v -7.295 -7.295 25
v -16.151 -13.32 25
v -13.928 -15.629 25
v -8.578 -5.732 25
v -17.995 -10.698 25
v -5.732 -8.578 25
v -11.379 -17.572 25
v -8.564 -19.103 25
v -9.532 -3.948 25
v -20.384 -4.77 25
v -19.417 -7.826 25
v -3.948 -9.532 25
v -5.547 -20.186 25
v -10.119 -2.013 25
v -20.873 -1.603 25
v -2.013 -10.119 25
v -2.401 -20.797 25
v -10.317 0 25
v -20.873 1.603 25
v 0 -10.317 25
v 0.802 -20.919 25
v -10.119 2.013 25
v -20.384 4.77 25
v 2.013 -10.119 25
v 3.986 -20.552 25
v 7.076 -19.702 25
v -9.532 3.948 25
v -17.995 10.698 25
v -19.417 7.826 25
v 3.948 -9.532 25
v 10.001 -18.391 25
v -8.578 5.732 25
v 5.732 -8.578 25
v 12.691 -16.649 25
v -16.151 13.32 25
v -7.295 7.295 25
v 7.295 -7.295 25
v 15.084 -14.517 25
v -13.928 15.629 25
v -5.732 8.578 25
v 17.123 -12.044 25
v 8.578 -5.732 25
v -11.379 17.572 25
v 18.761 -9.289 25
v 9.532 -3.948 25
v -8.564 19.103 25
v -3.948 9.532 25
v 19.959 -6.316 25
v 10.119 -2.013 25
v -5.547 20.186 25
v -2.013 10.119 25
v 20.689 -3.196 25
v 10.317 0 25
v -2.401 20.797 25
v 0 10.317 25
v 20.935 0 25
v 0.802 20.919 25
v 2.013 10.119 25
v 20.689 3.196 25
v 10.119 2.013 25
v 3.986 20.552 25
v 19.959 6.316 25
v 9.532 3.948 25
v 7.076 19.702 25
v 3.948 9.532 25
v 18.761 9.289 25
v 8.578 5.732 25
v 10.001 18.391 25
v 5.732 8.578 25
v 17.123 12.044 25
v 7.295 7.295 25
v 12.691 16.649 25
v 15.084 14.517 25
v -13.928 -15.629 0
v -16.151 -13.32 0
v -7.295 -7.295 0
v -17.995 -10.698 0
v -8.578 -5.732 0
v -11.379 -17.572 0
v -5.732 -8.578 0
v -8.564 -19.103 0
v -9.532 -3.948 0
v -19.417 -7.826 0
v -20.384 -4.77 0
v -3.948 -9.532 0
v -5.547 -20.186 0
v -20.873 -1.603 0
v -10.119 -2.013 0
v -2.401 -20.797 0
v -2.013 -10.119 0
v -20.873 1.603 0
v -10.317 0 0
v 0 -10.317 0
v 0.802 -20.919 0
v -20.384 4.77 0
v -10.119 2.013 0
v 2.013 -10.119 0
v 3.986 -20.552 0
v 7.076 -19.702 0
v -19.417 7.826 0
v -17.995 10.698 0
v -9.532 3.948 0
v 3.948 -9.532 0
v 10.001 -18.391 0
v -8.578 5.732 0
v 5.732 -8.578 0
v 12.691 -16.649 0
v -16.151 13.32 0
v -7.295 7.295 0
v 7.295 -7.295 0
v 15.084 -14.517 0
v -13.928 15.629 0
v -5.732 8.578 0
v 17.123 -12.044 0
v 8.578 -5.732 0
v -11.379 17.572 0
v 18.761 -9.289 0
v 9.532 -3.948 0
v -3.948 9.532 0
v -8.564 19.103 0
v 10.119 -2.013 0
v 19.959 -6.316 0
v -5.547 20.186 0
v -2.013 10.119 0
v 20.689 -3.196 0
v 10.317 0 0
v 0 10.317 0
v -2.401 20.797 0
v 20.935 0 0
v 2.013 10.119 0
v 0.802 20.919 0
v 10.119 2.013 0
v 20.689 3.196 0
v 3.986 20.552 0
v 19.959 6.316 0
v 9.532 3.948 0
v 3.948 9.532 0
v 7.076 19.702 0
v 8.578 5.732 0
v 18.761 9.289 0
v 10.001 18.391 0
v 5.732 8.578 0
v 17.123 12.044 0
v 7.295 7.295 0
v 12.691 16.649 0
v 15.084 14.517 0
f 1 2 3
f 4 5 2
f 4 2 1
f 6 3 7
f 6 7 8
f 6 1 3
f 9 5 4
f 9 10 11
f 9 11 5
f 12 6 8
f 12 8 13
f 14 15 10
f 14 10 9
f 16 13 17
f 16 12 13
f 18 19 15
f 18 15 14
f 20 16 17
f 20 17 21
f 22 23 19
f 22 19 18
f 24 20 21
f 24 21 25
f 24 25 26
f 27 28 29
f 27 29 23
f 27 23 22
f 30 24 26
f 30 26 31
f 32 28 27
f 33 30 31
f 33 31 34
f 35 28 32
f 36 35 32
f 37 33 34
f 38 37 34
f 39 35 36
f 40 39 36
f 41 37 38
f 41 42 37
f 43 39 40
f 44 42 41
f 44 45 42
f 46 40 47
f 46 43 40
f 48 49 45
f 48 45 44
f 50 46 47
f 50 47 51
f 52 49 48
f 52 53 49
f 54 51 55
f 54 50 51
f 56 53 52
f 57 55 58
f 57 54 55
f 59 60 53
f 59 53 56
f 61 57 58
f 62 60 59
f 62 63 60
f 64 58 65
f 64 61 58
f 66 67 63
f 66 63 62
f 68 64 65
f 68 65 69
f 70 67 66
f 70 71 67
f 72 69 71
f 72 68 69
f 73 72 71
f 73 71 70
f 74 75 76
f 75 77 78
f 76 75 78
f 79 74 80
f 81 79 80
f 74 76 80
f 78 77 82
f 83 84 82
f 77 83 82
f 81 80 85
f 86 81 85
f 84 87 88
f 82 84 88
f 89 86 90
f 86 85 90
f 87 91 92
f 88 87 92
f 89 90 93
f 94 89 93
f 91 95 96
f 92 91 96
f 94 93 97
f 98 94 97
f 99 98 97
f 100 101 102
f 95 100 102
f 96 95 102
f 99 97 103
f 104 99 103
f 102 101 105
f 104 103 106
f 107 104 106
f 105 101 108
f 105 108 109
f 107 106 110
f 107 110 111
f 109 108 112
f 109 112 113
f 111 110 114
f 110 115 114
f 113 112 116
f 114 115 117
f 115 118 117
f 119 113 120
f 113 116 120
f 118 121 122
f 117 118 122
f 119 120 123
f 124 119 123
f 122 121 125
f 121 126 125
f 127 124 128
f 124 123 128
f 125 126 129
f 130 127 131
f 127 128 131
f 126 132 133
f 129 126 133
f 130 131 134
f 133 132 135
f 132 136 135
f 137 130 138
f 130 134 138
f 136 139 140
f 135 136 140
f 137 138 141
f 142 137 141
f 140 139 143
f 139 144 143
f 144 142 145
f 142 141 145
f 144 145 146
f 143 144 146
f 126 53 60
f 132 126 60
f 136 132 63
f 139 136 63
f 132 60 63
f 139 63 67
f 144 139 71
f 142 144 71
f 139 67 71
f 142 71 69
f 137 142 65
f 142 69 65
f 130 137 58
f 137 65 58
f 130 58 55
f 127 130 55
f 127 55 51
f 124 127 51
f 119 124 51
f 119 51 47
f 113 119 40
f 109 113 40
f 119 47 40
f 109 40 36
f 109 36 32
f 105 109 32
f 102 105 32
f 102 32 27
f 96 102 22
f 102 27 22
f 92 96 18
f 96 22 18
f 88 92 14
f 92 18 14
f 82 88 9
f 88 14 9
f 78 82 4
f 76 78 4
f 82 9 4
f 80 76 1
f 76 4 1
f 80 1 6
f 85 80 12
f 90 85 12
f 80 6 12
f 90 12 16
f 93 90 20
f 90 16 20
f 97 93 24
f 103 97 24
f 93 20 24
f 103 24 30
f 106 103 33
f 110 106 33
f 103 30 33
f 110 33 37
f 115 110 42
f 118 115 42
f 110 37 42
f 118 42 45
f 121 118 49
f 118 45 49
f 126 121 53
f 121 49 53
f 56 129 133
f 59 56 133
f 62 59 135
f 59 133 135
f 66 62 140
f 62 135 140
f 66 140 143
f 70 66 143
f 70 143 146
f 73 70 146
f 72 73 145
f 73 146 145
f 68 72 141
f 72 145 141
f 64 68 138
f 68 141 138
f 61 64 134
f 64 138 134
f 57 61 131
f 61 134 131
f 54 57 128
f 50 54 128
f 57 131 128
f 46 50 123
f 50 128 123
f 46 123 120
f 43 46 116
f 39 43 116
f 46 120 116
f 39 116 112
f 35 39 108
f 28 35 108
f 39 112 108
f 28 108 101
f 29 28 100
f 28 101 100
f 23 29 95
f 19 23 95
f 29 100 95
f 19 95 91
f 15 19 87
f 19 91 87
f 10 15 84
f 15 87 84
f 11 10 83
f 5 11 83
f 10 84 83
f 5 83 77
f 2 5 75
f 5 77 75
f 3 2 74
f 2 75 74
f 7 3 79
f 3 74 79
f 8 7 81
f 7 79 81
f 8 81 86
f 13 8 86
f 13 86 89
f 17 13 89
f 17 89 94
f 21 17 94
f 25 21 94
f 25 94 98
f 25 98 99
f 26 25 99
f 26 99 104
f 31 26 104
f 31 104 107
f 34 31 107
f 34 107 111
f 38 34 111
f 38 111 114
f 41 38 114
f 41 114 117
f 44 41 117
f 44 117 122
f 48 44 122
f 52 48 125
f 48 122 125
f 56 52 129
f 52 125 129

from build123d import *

# Parameters (mm, degrees)
F0_R     = 20.9347
F1_DEPTH = 25
F2_R     = 9.210685
F3_DEPTH = 25
F4_R     = 10.317233
F5_DEPTH = 25


with BuildPart() as f1:
    # F0 (on Top) → F1 (new body)
    with BuildSketch(Plane.XY):
        Circle(F0_R)
    extrude(amount=F1_DEPTH)

    # F2 (on face) → F3 (join)
    with BuildSketch(Plane.XY.offset(25)):
        Circle(F2_R)
    extrude(amount=-F3_DEPTH)

    # F4 (on face) → F5 (cut)
    with BuildSketch(Plane.XY.offset(25)):
        Circle(F4_R)
    extrude(amount=-F5_DEPTH, mode=Mode.SUBTRACT)


solid = f1.part
